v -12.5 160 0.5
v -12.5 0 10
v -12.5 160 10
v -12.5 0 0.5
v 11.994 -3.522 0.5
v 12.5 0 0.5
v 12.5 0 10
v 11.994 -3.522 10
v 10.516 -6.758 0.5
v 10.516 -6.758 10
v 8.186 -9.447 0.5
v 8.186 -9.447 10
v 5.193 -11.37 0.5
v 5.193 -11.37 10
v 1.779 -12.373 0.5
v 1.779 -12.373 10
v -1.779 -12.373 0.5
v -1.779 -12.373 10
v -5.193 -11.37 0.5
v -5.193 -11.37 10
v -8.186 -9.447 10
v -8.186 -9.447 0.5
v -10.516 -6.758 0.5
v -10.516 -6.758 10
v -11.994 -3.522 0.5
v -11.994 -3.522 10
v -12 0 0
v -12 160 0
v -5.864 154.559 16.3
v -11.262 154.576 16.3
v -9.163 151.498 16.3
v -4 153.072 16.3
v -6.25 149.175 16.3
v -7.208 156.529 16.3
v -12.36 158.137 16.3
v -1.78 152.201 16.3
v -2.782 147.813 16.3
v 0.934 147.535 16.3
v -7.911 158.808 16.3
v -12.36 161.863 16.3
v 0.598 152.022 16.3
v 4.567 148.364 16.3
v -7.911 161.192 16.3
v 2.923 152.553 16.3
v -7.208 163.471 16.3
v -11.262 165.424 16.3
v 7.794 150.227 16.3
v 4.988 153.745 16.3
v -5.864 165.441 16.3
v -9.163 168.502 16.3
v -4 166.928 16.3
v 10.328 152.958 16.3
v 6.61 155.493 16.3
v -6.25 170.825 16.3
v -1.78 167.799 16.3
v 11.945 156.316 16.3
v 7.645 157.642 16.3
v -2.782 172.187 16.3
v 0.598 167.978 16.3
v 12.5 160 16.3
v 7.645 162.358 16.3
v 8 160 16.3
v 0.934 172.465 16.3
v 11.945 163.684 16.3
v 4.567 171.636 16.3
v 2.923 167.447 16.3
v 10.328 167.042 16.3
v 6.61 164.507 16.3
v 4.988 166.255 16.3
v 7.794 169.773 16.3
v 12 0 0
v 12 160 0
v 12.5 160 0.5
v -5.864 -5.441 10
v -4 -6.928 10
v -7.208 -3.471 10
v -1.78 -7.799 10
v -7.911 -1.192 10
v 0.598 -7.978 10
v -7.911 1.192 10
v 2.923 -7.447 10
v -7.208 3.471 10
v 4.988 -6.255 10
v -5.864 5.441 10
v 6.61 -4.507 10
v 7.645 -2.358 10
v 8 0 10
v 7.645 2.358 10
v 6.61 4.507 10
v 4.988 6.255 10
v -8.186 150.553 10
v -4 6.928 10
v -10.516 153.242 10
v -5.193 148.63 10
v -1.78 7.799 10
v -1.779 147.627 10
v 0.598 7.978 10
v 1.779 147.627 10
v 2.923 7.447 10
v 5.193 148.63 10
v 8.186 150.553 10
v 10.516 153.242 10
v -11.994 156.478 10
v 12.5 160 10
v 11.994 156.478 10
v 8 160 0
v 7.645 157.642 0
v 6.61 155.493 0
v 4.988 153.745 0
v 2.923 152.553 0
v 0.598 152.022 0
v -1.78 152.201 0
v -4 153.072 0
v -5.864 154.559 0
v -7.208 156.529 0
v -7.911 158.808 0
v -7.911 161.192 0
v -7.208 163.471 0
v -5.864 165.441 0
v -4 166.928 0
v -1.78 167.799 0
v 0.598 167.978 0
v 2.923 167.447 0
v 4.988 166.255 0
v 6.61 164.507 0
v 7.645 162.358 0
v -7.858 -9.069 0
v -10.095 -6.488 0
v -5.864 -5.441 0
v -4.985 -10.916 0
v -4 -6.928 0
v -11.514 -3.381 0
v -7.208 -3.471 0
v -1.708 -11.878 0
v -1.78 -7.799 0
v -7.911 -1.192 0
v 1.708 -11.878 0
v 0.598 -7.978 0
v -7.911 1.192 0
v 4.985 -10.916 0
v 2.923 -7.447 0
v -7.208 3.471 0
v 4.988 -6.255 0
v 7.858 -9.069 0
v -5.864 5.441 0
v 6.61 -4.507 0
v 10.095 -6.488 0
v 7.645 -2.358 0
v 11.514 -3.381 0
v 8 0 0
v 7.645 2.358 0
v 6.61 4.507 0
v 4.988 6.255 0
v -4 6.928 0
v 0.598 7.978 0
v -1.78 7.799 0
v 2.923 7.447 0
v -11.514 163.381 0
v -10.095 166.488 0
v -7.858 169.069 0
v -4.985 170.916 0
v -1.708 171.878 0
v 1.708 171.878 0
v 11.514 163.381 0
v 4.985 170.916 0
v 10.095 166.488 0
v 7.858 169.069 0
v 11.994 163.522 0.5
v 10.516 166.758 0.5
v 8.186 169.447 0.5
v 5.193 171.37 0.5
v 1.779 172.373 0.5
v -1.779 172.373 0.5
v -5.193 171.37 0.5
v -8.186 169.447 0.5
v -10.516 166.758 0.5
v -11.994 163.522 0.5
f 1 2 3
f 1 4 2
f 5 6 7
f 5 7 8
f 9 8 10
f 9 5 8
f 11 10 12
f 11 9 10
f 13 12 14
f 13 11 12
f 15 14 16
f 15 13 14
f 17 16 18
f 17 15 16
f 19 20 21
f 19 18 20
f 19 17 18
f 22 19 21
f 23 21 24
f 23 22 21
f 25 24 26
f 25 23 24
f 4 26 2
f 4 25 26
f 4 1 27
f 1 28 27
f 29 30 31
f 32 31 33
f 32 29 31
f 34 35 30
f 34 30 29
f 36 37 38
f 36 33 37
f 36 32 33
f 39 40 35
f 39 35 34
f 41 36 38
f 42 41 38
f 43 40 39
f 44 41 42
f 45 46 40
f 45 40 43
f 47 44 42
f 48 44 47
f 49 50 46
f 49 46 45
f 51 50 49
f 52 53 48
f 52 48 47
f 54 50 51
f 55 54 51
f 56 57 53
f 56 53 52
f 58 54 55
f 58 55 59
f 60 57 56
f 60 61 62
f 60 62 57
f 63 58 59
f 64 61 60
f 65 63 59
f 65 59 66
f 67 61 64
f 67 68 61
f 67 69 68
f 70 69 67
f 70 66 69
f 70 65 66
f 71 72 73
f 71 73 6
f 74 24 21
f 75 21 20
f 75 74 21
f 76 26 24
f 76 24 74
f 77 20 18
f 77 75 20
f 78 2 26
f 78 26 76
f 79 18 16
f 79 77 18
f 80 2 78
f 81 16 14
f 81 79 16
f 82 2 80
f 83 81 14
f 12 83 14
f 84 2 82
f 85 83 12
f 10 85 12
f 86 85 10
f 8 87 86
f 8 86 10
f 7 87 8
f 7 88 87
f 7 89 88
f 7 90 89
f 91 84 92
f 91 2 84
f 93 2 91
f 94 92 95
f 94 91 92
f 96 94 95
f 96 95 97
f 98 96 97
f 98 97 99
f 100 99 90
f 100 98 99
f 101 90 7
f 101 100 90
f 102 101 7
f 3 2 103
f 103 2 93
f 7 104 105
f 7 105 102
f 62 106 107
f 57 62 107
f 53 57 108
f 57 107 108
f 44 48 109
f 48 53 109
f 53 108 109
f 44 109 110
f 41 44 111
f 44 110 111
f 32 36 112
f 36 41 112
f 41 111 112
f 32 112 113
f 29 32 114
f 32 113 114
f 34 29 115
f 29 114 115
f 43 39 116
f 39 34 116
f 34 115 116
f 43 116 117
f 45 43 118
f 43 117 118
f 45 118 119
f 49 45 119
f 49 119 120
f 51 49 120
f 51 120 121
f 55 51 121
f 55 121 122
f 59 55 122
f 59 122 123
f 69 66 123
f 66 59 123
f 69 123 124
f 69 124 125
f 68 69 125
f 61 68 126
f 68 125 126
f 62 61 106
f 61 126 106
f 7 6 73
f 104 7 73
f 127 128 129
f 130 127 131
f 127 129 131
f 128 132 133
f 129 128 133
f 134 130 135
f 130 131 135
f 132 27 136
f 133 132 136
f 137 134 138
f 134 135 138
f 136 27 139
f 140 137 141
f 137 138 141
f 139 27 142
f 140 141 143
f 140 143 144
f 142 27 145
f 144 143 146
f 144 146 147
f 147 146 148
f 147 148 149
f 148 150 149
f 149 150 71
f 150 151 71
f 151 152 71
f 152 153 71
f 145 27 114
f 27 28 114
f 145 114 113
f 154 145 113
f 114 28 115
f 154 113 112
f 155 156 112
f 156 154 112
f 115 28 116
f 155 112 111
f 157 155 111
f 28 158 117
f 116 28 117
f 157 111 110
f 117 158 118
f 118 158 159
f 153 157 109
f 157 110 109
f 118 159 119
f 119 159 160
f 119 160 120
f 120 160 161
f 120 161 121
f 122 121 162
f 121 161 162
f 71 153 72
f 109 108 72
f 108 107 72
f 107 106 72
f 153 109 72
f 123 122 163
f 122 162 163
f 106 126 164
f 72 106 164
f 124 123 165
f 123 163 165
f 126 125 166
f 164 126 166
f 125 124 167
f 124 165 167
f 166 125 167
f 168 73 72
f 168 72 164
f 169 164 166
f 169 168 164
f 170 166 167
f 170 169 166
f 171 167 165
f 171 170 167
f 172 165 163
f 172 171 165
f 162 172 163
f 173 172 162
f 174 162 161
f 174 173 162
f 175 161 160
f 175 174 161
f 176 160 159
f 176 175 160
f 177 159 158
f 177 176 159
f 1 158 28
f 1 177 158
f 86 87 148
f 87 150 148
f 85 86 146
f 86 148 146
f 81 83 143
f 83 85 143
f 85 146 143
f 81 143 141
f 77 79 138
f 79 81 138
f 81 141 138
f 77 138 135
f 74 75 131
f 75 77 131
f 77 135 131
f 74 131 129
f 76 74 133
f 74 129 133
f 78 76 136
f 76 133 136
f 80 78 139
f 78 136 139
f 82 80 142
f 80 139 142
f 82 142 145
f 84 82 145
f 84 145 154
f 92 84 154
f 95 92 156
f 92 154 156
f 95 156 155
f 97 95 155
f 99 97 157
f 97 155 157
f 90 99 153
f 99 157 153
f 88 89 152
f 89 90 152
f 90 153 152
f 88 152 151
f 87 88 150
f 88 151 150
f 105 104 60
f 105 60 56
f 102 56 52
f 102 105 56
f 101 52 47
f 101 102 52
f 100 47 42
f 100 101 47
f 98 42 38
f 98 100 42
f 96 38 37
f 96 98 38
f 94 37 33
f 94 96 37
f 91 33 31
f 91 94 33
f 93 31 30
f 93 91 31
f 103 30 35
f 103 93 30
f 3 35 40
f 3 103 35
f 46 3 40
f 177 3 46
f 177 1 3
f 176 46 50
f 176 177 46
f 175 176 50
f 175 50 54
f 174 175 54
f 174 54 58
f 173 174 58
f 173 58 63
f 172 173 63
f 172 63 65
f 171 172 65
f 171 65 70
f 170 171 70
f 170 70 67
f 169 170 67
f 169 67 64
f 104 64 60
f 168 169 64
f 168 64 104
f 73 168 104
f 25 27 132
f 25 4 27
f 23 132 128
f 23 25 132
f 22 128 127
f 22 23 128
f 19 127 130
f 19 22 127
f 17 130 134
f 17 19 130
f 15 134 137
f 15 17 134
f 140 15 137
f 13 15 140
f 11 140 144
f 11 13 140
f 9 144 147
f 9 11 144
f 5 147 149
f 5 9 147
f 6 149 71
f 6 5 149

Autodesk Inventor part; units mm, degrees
sketch "Skizze5" plane through (0, 0, 0) normal (0, 0, 1) x (1, 0, 0)
  circle A0 centre (0, 0) radius 12.5
  circle A1 centre (0, 0) radius 8
  circle A2 centre (0, 160) radius 12.5
  circle A3 centre (0, 160) radius 8
  line L0 (0, 0) -> (0, 160) construction
  line L1 (-12.5, 0) -> (-12.5, 160)
  line L2 (12.5, 0) -> (12.5, 160)
  circle A4 centre (0, 80) radius 3
  dimension "d98" = 25
  dimension "d99" = 16
  dimension "d100" = 160
  dimension "d110" = 16
  dimension "d116" = 6
  dimension "d117" = 80
extrude "Extrusion8" add sketch "Skizze5" along normal blind 10 contours A0 | A0 L1 A2 L2 | A2 | A4
extrude "Extrusion12" add sketch "Skizze5" along normal blind 6.3 from surface at 10 contours A2
chamfer "Fase1" distance 0.5 angle 45 4 edges at (-12.5, 80, 0) (0, -12.5, 0) (12.5, 80, 0) (0, 172.5, 0)
equation "\"Anlaufscheibe_Thickness\" = 1"
equation "\"BaseFrame_InnerWidth\" = 83"
equation "\"Rillenkugellager_Flanschdicke\" = 1.1"
properties part number "ParallelSystem_ProximalPart_SupportLink" material "PBT-Kunststoff"
